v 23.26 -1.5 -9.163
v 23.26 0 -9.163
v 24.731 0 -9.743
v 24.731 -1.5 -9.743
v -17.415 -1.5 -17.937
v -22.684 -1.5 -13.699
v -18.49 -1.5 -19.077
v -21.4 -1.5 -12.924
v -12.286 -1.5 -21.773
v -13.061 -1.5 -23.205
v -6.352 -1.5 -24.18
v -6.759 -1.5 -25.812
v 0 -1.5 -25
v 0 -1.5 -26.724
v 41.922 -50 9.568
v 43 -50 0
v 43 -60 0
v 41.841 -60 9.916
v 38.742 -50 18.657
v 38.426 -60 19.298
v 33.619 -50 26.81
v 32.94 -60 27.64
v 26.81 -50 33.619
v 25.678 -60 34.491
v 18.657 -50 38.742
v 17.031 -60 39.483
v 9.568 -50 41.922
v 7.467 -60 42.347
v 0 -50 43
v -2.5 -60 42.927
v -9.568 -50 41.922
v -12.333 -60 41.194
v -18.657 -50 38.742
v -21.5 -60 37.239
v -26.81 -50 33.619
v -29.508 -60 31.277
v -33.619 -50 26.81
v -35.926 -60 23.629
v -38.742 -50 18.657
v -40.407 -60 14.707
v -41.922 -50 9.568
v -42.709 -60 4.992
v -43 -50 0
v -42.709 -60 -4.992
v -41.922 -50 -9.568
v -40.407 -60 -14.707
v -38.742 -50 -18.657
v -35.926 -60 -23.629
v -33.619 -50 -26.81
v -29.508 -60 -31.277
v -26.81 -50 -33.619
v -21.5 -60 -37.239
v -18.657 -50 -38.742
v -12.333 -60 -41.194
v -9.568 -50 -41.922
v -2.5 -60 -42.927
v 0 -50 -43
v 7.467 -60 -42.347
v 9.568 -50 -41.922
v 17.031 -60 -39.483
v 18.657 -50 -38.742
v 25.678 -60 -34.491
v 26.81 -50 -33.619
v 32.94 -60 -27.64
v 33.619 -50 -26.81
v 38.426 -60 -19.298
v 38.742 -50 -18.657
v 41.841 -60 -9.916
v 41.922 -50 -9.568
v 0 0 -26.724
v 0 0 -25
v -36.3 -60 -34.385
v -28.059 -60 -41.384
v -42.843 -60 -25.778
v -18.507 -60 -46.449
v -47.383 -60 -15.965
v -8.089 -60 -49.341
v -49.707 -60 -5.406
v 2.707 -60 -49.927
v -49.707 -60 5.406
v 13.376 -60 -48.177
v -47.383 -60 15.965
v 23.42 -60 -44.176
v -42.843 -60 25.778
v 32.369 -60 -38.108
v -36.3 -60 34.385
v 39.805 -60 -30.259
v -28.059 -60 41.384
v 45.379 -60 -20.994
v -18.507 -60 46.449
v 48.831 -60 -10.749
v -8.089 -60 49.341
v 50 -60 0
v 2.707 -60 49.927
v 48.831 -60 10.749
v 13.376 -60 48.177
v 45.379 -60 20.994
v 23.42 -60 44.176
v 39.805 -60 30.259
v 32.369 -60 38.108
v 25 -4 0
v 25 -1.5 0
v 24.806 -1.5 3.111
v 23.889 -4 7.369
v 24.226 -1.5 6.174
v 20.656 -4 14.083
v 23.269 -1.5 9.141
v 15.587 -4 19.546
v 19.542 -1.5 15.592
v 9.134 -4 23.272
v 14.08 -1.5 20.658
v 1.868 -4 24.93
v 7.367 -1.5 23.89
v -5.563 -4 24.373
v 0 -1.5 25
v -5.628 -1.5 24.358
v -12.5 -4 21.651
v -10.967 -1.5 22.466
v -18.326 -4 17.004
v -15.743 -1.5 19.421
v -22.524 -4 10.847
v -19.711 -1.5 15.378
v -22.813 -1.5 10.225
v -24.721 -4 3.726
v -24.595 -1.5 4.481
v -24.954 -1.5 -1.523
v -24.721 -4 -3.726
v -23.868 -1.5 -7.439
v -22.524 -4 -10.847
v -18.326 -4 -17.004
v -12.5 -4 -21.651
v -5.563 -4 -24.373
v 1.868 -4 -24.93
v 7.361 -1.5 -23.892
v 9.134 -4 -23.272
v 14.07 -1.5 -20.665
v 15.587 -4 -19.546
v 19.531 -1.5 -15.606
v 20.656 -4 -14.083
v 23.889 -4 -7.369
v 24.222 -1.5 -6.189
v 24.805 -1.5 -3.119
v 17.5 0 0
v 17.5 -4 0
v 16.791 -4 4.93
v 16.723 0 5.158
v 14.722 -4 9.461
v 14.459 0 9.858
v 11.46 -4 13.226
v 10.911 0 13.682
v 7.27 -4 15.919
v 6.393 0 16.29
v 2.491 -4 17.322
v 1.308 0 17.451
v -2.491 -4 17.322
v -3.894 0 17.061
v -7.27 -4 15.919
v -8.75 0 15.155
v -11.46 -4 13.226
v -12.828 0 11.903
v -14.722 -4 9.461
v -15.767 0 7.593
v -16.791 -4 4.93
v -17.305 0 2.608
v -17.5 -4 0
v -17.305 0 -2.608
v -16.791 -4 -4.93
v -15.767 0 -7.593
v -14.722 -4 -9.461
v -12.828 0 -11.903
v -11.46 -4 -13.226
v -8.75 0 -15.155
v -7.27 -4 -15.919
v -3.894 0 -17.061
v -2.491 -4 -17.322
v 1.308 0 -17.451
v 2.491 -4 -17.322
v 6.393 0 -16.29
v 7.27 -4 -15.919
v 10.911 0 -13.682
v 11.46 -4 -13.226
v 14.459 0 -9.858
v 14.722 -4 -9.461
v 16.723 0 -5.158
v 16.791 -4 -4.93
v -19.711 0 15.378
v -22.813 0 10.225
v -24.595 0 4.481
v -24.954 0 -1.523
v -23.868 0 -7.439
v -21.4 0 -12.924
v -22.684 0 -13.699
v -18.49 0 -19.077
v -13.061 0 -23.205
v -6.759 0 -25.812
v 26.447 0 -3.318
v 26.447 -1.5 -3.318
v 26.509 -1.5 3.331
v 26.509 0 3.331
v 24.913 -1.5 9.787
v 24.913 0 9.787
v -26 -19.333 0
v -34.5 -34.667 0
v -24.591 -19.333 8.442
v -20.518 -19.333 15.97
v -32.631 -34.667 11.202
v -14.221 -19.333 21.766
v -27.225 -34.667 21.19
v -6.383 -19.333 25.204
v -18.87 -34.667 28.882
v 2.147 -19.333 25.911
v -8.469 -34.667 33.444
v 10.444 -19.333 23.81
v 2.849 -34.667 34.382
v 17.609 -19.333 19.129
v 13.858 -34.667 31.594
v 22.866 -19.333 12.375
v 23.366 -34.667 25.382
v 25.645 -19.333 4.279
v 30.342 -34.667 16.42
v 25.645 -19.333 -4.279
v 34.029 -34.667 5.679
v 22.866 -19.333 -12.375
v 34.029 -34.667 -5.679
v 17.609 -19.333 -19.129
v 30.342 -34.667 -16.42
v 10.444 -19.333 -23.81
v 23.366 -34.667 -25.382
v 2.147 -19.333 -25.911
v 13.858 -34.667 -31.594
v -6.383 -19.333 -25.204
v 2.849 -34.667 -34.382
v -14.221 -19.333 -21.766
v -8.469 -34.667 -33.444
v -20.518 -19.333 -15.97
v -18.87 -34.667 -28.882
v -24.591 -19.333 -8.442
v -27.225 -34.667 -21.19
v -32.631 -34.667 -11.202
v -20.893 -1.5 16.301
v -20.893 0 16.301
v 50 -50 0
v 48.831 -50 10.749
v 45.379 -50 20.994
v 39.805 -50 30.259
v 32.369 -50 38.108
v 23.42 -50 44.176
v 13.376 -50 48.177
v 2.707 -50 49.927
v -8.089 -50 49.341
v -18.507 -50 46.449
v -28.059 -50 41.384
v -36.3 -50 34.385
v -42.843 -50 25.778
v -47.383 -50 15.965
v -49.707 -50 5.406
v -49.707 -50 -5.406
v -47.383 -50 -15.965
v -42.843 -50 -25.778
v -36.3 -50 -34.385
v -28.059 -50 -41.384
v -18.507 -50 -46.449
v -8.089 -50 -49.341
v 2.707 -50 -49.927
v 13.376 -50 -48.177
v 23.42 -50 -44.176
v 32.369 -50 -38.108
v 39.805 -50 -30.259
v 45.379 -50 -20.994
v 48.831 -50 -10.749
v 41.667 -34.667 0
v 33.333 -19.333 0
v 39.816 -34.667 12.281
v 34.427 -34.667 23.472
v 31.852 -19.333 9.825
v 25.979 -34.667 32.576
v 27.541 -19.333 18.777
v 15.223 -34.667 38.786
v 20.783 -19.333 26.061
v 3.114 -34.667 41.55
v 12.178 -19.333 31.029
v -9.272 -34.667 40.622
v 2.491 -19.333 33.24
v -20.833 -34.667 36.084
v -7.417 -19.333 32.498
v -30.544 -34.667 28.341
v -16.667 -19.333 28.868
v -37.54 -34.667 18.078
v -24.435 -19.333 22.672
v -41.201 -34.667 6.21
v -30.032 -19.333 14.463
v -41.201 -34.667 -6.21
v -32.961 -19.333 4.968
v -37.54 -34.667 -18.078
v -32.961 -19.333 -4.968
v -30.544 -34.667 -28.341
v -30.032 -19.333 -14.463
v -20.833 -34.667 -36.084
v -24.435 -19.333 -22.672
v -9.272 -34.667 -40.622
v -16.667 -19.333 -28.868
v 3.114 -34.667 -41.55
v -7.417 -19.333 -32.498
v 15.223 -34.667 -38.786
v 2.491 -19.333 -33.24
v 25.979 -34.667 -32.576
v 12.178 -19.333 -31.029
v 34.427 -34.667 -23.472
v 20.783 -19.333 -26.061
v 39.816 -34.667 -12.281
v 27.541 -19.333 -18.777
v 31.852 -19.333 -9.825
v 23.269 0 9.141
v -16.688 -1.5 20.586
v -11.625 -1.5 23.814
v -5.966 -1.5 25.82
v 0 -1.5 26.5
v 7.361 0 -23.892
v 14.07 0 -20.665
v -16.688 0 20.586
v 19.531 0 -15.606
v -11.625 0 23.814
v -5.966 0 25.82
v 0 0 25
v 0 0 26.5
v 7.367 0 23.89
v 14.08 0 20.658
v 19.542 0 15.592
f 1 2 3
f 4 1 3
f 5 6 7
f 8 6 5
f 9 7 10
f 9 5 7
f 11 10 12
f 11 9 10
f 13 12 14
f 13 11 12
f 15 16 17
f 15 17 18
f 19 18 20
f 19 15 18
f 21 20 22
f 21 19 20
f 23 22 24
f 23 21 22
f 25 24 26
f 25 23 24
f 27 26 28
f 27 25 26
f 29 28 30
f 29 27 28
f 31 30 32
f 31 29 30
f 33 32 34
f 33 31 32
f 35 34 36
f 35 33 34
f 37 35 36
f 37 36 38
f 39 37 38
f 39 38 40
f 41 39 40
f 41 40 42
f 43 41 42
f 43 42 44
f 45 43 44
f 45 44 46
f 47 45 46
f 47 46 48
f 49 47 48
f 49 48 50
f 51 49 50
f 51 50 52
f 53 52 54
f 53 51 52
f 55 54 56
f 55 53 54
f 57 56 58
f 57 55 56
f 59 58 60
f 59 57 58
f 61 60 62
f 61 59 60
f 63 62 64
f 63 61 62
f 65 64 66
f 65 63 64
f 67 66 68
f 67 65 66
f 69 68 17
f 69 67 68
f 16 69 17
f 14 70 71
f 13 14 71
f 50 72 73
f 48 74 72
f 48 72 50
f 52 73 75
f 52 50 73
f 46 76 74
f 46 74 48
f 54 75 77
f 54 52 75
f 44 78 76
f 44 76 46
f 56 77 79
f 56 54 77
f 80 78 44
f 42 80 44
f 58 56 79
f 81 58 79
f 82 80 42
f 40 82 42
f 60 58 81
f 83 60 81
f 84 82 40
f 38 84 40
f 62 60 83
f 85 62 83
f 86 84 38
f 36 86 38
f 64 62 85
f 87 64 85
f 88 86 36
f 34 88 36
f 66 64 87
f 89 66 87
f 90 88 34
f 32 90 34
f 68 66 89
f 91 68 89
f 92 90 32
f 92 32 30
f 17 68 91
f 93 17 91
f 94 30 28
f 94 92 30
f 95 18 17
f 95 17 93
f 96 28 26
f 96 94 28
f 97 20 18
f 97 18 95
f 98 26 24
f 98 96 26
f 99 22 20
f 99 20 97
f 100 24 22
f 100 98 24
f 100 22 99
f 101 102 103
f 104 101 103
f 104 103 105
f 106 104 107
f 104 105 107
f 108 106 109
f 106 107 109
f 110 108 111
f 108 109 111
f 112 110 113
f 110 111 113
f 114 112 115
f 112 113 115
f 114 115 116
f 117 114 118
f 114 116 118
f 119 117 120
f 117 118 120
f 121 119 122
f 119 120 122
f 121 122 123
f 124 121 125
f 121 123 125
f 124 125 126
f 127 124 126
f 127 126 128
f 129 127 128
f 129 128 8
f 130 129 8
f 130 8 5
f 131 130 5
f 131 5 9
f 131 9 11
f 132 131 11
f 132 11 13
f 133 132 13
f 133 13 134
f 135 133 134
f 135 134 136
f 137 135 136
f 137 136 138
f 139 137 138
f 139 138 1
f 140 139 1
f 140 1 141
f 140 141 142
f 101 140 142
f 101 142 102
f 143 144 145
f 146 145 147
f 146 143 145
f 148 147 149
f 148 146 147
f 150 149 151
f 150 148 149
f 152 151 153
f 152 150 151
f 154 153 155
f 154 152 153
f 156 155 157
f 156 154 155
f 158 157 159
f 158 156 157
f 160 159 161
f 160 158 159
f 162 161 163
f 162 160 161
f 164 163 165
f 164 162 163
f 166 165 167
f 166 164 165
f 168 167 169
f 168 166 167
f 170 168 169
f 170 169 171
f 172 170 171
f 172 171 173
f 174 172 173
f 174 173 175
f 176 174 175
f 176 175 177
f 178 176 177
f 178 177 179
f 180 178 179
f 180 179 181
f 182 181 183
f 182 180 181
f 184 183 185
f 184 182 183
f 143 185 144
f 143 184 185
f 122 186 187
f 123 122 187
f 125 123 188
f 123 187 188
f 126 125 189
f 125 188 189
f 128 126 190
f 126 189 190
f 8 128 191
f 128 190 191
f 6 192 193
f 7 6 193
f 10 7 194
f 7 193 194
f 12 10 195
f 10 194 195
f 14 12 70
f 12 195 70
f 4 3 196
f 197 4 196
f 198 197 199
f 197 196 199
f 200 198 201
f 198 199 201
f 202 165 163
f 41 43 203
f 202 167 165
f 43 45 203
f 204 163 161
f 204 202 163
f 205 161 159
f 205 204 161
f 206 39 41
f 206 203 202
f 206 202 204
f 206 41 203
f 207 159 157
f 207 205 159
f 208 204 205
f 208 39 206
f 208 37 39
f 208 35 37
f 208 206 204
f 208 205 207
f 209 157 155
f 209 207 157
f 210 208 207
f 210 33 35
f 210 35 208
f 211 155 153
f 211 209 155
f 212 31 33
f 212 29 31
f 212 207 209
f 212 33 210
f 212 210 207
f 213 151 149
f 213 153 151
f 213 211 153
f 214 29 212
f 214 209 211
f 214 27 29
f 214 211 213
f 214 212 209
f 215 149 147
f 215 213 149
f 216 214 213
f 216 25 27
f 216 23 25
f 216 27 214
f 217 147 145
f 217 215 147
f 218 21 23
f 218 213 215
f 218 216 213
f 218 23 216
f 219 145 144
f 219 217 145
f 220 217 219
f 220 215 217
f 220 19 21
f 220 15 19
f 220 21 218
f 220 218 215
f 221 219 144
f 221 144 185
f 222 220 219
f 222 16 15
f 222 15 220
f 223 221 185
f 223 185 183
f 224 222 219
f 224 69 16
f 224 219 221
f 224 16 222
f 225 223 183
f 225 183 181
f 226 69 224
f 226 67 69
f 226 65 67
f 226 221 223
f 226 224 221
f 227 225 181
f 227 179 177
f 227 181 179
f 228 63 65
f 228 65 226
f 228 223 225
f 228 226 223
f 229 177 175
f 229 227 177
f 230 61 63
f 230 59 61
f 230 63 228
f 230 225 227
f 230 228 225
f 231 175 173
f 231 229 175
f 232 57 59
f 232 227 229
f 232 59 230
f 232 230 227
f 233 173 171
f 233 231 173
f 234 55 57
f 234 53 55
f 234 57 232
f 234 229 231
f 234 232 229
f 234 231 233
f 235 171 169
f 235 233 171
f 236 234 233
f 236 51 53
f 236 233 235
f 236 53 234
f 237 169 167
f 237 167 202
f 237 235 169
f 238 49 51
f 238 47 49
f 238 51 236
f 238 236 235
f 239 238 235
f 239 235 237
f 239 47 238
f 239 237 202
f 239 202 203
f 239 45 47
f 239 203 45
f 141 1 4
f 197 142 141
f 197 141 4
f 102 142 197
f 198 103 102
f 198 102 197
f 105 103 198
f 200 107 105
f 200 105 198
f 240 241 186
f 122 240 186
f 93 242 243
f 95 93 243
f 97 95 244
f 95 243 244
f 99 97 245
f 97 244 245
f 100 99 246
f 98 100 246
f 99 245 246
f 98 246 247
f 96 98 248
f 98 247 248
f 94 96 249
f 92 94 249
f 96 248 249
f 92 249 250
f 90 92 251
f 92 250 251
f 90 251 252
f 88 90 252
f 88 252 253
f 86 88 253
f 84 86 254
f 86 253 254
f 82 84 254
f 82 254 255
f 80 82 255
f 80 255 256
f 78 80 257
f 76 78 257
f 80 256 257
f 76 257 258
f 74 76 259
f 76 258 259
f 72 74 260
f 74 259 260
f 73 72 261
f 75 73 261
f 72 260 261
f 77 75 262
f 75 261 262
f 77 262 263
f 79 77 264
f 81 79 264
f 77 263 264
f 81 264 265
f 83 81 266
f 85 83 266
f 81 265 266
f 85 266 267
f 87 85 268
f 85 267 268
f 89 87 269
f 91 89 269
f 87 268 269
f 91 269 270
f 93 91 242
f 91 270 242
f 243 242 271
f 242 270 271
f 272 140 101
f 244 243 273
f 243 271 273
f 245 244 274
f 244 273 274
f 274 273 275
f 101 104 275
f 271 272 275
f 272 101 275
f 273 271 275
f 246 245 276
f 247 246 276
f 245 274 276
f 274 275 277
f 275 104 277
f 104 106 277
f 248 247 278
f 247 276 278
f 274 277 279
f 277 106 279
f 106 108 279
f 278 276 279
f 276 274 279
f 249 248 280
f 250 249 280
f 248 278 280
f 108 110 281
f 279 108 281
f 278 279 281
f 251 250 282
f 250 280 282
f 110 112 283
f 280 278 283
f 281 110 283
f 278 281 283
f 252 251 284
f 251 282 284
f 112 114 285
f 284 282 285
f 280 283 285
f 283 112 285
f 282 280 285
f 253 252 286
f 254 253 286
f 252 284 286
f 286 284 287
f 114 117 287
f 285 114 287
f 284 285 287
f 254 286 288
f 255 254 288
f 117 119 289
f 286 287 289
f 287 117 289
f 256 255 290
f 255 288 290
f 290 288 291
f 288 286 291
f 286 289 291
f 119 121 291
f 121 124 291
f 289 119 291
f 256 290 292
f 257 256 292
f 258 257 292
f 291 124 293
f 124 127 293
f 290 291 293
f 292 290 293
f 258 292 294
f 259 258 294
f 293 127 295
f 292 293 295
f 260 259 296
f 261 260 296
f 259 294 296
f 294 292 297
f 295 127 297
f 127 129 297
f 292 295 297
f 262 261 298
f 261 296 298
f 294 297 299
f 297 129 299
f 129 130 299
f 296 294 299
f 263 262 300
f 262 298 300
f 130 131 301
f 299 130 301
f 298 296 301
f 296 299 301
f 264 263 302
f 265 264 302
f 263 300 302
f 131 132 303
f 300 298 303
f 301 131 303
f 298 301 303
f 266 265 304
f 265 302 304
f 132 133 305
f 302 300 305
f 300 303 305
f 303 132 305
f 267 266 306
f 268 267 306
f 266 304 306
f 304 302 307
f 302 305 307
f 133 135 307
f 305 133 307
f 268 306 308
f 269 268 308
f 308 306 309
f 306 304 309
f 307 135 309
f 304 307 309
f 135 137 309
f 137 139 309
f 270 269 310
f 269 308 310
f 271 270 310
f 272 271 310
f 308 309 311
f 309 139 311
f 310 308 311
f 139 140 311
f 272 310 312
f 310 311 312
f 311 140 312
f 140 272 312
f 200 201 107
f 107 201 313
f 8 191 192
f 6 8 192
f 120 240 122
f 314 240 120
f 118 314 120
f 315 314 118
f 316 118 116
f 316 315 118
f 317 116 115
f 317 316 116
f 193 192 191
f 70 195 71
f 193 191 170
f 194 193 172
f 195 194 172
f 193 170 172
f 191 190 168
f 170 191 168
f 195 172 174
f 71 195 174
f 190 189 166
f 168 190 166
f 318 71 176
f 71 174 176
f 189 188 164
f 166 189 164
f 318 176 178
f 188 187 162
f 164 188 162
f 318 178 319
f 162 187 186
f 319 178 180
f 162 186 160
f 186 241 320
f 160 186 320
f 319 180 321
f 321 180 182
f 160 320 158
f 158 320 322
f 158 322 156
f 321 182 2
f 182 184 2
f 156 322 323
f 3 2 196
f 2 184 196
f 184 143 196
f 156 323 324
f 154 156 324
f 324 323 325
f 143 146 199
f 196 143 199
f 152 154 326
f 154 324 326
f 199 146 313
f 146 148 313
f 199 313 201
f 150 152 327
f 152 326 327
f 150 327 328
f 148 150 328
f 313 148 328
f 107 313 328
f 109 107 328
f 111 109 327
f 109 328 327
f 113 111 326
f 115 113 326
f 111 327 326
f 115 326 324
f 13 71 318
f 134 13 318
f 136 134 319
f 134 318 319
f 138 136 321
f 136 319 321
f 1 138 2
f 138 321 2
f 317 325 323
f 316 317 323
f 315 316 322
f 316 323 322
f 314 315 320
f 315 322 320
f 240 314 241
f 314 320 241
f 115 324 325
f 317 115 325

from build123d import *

# Parameters (mm, degrees)
F0_R      = 17.5
F1_DEPTH  = 1.5
F2_R      = 25
F2_R_2    = 17.5
F3_DEPTH  = 2.5
F6_R      = 50
F5_R      = 25
F9_R      = 17.5
F8_R      = 43
F11_R     = 50
F11_R_2   = 43
F12_DEPTH = 10


with BuildPart() as f1:
    # F0 (on Front) → F1 (new body)
    with BuildSketch(Plane.XZ):
        with BuildLine():
            ThreePointArc((23.2602203248, -9.1630862947), (24.5612042469, -4.663394251), (25, 0))
            ThreePointArc((25, 0), (24.5634220452, 4.651698338), (23.2689362058, 9.1409303603))
            ThreePointArc((23.2689362058, 9.1409303603), (14.0797148585, 20.6582097362), (0, 25))
            ThreePointArc((0, 25), (-10.9669811321, 22.4660927811), (-19.7108172513, 15.3780259879))
            ThreePointArc((-19.7108172513, 15.3780259879), (-24.9555737451, 1.4897446272), (-21.4003229393, -12.9238608046))
            ThreePointArc((-21.4003229393, -12.9238608046), (-12.2862418967, -21.7726493578), (0, -25))
            ThreePointArc((0, -25), (14.0698763789, -20.6649117754), (23.2602203248, -9.1630862947))
        make_face()
        Circle(F0_R, mode=Mode.SUBTRACT)
        with BuildLine():
            ThreePointArc((23.2689362058, 9.1409303603), (24.5634220452, 4.651698338), (25, 0))
            ThreePointArc((25, 0), (24.5612042469, -4.663394251), (23.2602203248, -9.1630862947))
            Line((23.2602203248, -9.1630862947), (24.7313799339, -9.7426320713))
            ThreePointArc((24.7313799339, -9.7426320713), (26.6870958696, 0.0047625742), (24.9132933265, 9.7868968881))
            Line((24.9132933265, 9.7868968881), (23.2689362058, 9.1409303603))
        make_face()
        with BuildLine():
            ThreePointArc((-19.7108172513, 15.3780259879), (-10.9669811321, 22.4660927811), (0, 25))
            Line((0, 25), (0, 26.5))
            ThreePointArc((0, 26.5), (-11.625, 23.814058348), (-20.8934662864, 16.3007075472))
            Line((-20.8934662864, 16.3007075472), (-19.7108172513, 15.3780259879))
        make_face()
        with BuildLine():
            Line((0, -26.7237641467), (0, -25))
            ThreePointArc((0, -25), (-12.2862418967, -21.7726493578), (-21.4003229393, -12.9238608046))
            Line((-21.4003229393, -12.9238608046), (-22.6843423156, -13.6992924528))
            ThreePointArc((-22.6843423156, -13.6992924528), (-13.0611614327, -23.205443504), (0, -26.7237641467))
        make_face()
    extrude(amount=F1_DEPTH)

    # F2 (on face) → F3 (join)
    with BuildSketch(Plane.XZ.offset(1.5)):
        Circle(F2_R)
        Circle(F2_R_2, mode=Mode.SUBTRACT)
    extrude(amount=F3_DEPTH)

    # F6 (on offset) → F7 section 0
    with BuildSketch(Plane.XZ.offset(50)):
        Circle(F6_R)
    # F5 (on face) → F7 section 1
    with BuildSketch(Plane.XZ.offset(4)):
        Circle(F5_R)
    loft()

    # F9 (on face) → F10 section 0
    with BuildSketch(Plane(origin=(0, -4, 0), x_dir=(-1, 0, 0), z_dir=(0, 1, 0))):
        Circle(F9_R)
    # F8 (on face) → F10 section 1
    with BuildSketch(Plane.XZ.offset(50)):
        Circle(F8_R)
    loft(mode=Mode.SUBTRACT)

    # F11 (on face) → F12 (join)
    with BuildSketch(Plane.XZ.offset(50)):
        Circle(F11_R)
        Circle(F11_R_2, mode=Mode.SUBTRACT)
    extrude(amount=F12_DEPTH)


solid = f1.part
